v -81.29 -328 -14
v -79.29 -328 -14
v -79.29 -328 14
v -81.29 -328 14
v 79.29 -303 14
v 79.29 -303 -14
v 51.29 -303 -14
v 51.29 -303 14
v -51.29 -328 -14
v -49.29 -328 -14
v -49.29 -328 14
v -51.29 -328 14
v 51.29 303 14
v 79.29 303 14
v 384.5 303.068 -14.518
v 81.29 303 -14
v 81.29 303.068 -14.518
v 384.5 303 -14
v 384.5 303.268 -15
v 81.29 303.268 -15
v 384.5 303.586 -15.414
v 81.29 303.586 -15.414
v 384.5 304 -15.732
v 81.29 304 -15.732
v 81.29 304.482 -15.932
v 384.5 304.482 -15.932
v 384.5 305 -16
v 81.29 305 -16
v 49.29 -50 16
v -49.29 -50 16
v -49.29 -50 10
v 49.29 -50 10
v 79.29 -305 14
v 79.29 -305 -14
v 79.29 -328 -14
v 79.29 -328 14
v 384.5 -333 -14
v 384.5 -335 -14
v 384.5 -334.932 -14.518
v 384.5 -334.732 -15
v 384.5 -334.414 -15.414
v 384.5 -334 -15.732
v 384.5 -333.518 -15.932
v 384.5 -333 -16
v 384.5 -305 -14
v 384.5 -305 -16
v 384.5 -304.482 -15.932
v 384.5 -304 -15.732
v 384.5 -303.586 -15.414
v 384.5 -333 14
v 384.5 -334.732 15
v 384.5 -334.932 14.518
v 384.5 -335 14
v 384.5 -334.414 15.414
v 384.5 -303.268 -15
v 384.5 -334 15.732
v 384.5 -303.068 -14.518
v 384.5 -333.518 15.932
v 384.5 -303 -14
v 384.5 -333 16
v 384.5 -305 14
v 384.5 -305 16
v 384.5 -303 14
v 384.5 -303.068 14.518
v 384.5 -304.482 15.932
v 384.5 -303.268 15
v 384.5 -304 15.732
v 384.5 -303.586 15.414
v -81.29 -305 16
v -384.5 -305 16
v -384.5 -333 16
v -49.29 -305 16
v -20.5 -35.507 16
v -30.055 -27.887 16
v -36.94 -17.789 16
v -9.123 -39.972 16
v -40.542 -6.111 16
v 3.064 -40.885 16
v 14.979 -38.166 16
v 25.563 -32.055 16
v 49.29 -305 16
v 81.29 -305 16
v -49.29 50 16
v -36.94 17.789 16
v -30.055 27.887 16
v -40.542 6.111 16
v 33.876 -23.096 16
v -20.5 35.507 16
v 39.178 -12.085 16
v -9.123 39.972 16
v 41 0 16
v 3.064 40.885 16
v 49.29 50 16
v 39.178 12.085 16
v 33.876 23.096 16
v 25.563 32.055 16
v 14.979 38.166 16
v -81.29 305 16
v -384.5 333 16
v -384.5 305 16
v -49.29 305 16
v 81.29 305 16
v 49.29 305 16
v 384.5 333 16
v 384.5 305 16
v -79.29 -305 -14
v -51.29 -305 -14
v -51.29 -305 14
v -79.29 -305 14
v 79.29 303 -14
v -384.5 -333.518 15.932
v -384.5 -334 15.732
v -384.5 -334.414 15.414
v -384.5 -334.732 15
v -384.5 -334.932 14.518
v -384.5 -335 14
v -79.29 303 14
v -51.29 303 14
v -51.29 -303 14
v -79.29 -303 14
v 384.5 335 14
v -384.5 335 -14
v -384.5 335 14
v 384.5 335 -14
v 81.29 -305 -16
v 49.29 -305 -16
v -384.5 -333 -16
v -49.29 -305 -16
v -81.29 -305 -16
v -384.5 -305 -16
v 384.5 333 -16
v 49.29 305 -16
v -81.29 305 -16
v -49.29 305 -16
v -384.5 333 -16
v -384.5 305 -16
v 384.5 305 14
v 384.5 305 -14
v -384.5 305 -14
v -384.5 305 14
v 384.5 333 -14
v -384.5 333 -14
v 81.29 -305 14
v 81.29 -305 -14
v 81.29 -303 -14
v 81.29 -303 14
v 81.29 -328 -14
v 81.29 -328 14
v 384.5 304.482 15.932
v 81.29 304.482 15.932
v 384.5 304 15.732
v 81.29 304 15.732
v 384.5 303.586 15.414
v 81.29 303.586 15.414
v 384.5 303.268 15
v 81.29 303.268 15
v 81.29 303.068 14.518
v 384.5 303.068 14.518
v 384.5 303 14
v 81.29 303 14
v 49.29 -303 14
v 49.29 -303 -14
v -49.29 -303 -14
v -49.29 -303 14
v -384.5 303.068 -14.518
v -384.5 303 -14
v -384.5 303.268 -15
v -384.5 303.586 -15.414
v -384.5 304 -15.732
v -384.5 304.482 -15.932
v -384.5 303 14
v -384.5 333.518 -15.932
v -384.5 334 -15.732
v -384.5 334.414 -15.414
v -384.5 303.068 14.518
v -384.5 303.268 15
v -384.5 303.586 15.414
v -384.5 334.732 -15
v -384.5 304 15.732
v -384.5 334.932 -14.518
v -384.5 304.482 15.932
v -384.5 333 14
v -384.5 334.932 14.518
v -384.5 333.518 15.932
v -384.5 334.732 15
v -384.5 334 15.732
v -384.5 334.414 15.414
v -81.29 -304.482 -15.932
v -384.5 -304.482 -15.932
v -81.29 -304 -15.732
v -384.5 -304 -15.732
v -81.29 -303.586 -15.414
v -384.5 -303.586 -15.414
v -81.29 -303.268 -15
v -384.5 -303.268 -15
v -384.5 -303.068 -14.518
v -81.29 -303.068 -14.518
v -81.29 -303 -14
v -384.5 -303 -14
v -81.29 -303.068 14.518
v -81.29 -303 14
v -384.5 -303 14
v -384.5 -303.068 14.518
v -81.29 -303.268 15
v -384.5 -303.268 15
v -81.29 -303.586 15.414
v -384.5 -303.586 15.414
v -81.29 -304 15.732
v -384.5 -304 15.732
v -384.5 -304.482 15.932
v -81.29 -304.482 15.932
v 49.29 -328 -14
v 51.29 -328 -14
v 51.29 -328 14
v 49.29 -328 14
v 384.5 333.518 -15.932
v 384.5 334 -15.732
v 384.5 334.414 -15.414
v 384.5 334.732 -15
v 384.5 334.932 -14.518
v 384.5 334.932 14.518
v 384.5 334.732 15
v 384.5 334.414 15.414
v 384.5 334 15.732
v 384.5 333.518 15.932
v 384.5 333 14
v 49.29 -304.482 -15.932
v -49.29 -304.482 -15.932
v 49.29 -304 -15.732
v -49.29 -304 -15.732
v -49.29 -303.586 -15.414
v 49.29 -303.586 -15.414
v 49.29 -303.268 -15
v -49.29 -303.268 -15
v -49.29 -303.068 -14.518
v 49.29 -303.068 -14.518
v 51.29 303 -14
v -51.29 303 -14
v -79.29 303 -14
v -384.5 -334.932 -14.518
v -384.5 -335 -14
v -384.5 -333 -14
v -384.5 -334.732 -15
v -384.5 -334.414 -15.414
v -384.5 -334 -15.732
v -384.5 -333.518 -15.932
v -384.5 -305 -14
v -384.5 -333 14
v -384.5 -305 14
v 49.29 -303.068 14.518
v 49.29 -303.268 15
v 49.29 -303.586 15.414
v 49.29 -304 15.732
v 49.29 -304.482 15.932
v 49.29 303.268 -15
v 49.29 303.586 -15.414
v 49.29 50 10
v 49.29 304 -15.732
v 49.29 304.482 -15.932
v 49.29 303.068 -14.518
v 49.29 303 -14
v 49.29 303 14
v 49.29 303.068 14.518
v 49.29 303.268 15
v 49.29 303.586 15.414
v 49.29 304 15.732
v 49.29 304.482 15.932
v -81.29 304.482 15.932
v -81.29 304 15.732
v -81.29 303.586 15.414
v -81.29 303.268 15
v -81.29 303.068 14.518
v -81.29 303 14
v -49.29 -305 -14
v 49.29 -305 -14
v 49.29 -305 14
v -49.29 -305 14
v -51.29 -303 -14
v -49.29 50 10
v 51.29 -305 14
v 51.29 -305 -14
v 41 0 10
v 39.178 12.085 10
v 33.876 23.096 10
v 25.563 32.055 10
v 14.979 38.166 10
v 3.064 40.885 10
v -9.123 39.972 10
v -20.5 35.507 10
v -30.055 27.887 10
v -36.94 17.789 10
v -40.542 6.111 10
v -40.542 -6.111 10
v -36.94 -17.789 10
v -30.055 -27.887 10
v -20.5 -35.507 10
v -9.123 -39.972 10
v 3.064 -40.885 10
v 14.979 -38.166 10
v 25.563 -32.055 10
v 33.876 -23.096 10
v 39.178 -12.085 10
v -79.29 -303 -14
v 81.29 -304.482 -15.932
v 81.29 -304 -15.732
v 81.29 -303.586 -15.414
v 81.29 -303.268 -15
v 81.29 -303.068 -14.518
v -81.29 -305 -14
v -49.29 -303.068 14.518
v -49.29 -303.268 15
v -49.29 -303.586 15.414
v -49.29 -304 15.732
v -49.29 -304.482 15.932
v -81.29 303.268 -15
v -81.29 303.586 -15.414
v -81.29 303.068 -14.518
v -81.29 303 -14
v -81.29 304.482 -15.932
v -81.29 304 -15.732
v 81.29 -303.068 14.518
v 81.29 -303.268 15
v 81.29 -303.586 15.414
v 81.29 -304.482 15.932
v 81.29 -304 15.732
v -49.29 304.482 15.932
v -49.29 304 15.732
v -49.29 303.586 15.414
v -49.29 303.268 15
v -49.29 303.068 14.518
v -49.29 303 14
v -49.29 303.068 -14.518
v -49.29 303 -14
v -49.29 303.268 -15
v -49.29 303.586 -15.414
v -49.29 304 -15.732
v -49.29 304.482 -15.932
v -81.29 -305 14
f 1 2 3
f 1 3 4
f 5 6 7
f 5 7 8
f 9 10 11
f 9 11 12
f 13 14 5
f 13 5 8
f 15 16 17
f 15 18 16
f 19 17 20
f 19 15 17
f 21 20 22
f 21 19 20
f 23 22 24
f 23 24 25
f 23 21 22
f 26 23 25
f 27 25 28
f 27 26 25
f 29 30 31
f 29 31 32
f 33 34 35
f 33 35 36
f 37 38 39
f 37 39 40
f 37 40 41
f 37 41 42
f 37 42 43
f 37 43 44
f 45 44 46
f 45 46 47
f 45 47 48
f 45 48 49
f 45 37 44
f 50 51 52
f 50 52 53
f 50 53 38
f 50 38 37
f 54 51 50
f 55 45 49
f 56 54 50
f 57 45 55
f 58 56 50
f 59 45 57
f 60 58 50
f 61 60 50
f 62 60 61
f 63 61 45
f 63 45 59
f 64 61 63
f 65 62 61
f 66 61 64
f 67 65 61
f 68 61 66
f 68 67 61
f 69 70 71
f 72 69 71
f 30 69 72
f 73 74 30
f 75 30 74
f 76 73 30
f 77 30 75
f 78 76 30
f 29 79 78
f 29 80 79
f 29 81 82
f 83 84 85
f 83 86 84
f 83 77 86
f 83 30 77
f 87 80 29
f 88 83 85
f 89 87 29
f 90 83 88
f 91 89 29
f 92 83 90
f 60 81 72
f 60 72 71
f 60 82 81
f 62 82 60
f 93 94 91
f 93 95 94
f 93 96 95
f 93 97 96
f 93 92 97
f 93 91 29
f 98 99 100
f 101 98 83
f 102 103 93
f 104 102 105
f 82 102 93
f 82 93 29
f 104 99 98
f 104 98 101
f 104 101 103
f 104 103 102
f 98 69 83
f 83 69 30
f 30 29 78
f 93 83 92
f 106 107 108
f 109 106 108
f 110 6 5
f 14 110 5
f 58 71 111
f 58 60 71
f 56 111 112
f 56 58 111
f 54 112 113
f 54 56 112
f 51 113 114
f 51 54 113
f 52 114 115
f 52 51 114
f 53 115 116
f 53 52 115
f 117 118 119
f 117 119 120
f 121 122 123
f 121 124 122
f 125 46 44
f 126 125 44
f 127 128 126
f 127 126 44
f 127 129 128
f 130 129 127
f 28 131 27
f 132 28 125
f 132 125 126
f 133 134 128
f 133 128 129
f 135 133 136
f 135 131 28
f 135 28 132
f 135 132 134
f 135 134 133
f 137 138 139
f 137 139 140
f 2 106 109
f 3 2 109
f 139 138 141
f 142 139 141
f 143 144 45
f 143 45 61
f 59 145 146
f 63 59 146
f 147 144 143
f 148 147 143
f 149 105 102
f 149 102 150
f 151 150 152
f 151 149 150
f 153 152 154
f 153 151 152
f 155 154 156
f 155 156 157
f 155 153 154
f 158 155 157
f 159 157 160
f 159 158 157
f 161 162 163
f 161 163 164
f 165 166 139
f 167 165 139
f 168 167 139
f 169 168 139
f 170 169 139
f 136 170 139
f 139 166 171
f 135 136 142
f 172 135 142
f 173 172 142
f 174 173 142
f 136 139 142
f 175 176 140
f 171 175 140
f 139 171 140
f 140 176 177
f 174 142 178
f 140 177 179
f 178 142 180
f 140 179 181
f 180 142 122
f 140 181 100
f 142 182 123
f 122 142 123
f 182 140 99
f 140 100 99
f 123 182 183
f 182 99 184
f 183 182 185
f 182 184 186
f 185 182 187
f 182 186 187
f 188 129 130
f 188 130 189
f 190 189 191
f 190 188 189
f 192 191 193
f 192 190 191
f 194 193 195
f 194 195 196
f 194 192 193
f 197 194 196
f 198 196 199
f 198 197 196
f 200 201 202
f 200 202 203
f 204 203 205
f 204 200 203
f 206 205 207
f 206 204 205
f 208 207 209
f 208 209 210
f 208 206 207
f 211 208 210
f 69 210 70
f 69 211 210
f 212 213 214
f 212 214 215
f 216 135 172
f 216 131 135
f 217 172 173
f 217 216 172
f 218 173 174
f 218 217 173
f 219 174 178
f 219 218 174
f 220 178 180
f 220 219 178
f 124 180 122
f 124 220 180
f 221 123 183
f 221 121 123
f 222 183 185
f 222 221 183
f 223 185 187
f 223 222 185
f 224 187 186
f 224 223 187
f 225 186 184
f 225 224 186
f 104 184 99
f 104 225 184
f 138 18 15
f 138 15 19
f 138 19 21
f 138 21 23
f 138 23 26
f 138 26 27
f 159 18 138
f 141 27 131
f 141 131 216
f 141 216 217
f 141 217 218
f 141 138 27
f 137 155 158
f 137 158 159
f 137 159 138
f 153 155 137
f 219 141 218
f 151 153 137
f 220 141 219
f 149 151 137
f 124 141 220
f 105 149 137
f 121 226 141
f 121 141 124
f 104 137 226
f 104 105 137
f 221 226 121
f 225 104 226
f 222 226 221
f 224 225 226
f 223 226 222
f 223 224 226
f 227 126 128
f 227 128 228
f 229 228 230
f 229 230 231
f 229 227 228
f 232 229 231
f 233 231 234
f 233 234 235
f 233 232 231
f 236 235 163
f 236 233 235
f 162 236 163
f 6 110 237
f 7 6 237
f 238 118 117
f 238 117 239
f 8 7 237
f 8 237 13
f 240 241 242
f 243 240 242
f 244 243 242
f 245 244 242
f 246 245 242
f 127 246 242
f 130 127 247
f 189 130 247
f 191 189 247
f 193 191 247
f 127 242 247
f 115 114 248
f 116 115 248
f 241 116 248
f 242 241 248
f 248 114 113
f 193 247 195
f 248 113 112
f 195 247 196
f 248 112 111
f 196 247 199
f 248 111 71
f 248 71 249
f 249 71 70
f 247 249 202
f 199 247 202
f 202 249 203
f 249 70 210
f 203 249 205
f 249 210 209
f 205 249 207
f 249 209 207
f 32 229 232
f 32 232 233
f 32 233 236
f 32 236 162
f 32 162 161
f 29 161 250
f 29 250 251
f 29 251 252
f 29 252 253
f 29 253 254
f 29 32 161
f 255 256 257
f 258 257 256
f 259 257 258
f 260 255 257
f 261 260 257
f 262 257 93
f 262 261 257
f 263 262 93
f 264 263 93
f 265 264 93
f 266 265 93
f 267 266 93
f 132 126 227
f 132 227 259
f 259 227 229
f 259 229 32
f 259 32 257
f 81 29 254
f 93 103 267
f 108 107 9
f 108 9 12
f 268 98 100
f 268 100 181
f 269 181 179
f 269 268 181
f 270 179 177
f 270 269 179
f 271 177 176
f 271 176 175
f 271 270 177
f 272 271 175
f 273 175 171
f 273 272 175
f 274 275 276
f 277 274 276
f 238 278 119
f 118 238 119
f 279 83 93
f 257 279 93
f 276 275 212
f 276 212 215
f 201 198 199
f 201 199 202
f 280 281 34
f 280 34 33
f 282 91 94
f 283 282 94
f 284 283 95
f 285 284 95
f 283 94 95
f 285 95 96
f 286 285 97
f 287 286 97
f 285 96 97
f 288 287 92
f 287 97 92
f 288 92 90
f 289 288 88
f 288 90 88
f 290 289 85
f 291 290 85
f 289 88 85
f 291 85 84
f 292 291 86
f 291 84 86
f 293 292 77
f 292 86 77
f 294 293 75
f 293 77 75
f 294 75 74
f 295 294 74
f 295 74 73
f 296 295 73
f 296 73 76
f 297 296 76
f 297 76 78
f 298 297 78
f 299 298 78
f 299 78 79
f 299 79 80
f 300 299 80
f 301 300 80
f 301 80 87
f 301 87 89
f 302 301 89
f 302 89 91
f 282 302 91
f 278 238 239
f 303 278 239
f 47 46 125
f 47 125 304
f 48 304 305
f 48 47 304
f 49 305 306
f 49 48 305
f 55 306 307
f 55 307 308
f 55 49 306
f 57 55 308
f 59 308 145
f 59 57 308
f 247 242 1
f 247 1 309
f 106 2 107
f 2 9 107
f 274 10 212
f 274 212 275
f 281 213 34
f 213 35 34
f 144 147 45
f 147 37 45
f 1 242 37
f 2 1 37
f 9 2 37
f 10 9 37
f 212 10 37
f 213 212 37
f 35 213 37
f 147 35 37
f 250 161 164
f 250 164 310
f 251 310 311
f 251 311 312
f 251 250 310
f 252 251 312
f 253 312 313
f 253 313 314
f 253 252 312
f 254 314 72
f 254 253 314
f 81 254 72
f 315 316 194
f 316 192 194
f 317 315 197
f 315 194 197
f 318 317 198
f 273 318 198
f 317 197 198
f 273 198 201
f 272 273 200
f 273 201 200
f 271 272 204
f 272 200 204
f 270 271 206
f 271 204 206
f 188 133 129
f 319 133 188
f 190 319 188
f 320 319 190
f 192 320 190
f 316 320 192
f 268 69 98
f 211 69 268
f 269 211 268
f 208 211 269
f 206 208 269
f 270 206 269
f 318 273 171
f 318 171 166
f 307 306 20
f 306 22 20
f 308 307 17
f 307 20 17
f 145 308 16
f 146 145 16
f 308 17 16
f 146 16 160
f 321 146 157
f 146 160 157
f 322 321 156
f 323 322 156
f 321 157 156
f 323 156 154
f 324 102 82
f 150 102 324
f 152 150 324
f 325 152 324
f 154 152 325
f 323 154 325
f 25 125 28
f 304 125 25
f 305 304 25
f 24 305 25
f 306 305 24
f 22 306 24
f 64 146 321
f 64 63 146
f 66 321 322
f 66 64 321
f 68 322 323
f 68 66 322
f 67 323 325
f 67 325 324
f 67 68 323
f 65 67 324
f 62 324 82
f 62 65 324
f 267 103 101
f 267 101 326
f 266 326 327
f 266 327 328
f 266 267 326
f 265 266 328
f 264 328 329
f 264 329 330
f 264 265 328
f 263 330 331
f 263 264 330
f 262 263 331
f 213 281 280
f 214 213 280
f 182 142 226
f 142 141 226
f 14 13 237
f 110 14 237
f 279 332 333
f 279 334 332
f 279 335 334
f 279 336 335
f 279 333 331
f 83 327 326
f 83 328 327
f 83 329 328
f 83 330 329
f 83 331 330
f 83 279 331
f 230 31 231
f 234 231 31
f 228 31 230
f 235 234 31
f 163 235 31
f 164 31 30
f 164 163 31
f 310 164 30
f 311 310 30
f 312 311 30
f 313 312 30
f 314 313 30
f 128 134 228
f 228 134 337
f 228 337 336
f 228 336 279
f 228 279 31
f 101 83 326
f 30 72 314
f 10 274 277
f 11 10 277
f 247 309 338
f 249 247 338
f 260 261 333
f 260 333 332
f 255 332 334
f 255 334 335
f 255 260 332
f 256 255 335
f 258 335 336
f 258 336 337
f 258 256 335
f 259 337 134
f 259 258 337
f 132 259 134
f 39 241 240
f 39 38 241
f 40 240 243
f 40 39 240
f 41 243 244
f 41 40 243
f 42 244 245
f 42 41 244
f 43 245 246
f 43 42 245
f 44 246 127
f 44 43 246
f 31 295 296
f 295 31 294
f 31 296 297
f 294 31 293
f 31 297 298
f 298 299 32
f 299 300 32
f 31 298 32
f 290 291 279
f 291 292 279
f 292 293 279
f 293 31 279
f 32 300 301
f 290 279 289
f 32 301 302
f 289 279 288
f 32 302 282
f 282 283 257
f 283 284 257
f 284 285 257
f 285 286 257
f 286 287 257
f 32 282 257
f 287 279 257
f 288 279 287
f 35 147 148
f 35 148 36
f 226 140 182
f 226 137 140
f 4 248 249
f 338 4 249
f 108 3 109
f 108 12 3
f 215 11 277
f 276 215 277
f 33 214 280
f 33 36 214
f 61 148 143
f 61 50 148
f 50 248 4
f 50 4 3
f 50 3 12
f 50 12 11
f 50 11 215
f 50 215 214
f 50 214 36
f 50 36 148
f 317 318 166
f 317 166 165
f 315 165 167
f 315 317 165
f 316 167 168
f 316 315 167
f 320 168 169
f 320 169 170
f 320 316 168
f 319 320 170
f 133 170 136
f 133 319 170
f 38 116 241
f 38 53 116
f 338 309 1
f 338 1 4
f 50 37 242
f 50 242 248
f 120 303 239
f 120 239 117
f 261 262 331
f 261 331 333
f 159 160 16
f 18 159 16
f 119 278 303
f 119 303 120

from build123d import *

# Parameters (mm, degrees)
F0_W          = 28
F0_H          = 28
F1_DEPTH      = 384.5
F2_W          = 32
F2_H          = 32
F2_W_2        = 28
F2_H_2        = 28
F3_DEPTH      = 608
F3_DEPTH_BACK = 25
F4_W          = 99.2901008725
F4_H          = 100
F5_DEPTH      = 6
F6_R          = 41
F7_DEPTH      = 32.001


with BuildPart() as f1:
    # F0 (on Right) → F1 (new body, symmetric)
    with BuildSketch(Plane.YZ):
        with BuildLine():
            ThreePointArc((-335, -14), (-334.4142135624, -15.4142135624), (-333, -16))
            Line((-333, -16), (-305, -16))
            ThreePointArc((-305, -16), (-303.5857864376, -15.4142135624), (-303, -14))
            Line((-303, -14), (-303, 14))
            ThreePointArc((-303, 14), (-303.5857864376, 15.4142135624), (-305, 16))
            Line((-305, 16), (-333, 16))
            ThreePointArc((-333, 16), (-334.4142135624, 15.4142135624), (-335, 14))
            Line((-335, 14), (-335, -14))
        make_face()
        with Locations((-319, 0)):
            Rectangle(F0_W, F0_H, mode=Mode.SUBTRACT)
    extrude(amount=F1_DEPTH, both=True)



with BuildPart() as f1b:
    # F0 (on Right) → F1, piece 2 (new body, symmetric)
    with BuildSketch(Plane.YZ):
        with BuildLine():
            ThreePointArc((335, 14), (334.4142135624, 15.4142135624), (333, 16))
            Line((333, 16), (305, 16))
            ThreePointArc((305, 16), (303.5857864376, 15.4142135624), (303, 14))
            Line((303, 14), (303, -14))
            ThreePointArc((303, -14), (303.5857864376, -15.4142135624), (305, -16))
            Line((305, -16), (333, -16))
            ThreePointArc((333, -16), (334.4142135624, -15.4142135624), (335, -14))
            Line((335, -14), (335, 14))
        make_face()
        with Locations((319, 0)):
            Rectangle(F0_W, F0_H, mode=Mode.SUBTRACT)
    extrude(amount=F1_DEPTH, both=True)


with BuildPart() as f1_1:
    add(f1.part)

    add(f1b.part)  # F3 merges F1b
    # F2 (on face) → F3 (join, two sides)
    with BuildSketch(Plane(origin=(0, -303, 0), x_dir=(-1, 0, 0), z_dir=(0, 1, 0))) as f3_sk:
        with Locations((-65.2901008725, 0)):
            Rectangle(F2_W, F2_H)
        with Locations((-65.2901008725, 0)):
            Rectangle(F2_W_2, F2_H_2, mode=Mode.SUBTRACT)
        with Locations((65.2901008725, 0)):
            Rectangle(F2_W, F2_H)
        with Locations((65.2901008725, 0)):
            Rectangle(F2_W_2, F2_H_2, mode=Mode.SUBTRACT)
    extrude(amount=F3_DEPTH)
    extrude(f3_sk.sketch, amount=-F3_DEPTH_BACK)

    # F4 (on face) → F5 (join)
    with BuildSketch(Plane.XY.offset(16)):
        with Locations((0.3549495637, 0)):
            Rectangle(F4_W, F4_H)
    extrude(amount=-F5_DEPTH)

    # F6 (on face) → F7 (cut, through all)
    with BuildSketch(Plane.XY.offset(16)):
        Circle(F6_R)
    extrude(amount=-F7_DEPTH, mode=Mode.SUBTRACT)


solid = f1_1.part
